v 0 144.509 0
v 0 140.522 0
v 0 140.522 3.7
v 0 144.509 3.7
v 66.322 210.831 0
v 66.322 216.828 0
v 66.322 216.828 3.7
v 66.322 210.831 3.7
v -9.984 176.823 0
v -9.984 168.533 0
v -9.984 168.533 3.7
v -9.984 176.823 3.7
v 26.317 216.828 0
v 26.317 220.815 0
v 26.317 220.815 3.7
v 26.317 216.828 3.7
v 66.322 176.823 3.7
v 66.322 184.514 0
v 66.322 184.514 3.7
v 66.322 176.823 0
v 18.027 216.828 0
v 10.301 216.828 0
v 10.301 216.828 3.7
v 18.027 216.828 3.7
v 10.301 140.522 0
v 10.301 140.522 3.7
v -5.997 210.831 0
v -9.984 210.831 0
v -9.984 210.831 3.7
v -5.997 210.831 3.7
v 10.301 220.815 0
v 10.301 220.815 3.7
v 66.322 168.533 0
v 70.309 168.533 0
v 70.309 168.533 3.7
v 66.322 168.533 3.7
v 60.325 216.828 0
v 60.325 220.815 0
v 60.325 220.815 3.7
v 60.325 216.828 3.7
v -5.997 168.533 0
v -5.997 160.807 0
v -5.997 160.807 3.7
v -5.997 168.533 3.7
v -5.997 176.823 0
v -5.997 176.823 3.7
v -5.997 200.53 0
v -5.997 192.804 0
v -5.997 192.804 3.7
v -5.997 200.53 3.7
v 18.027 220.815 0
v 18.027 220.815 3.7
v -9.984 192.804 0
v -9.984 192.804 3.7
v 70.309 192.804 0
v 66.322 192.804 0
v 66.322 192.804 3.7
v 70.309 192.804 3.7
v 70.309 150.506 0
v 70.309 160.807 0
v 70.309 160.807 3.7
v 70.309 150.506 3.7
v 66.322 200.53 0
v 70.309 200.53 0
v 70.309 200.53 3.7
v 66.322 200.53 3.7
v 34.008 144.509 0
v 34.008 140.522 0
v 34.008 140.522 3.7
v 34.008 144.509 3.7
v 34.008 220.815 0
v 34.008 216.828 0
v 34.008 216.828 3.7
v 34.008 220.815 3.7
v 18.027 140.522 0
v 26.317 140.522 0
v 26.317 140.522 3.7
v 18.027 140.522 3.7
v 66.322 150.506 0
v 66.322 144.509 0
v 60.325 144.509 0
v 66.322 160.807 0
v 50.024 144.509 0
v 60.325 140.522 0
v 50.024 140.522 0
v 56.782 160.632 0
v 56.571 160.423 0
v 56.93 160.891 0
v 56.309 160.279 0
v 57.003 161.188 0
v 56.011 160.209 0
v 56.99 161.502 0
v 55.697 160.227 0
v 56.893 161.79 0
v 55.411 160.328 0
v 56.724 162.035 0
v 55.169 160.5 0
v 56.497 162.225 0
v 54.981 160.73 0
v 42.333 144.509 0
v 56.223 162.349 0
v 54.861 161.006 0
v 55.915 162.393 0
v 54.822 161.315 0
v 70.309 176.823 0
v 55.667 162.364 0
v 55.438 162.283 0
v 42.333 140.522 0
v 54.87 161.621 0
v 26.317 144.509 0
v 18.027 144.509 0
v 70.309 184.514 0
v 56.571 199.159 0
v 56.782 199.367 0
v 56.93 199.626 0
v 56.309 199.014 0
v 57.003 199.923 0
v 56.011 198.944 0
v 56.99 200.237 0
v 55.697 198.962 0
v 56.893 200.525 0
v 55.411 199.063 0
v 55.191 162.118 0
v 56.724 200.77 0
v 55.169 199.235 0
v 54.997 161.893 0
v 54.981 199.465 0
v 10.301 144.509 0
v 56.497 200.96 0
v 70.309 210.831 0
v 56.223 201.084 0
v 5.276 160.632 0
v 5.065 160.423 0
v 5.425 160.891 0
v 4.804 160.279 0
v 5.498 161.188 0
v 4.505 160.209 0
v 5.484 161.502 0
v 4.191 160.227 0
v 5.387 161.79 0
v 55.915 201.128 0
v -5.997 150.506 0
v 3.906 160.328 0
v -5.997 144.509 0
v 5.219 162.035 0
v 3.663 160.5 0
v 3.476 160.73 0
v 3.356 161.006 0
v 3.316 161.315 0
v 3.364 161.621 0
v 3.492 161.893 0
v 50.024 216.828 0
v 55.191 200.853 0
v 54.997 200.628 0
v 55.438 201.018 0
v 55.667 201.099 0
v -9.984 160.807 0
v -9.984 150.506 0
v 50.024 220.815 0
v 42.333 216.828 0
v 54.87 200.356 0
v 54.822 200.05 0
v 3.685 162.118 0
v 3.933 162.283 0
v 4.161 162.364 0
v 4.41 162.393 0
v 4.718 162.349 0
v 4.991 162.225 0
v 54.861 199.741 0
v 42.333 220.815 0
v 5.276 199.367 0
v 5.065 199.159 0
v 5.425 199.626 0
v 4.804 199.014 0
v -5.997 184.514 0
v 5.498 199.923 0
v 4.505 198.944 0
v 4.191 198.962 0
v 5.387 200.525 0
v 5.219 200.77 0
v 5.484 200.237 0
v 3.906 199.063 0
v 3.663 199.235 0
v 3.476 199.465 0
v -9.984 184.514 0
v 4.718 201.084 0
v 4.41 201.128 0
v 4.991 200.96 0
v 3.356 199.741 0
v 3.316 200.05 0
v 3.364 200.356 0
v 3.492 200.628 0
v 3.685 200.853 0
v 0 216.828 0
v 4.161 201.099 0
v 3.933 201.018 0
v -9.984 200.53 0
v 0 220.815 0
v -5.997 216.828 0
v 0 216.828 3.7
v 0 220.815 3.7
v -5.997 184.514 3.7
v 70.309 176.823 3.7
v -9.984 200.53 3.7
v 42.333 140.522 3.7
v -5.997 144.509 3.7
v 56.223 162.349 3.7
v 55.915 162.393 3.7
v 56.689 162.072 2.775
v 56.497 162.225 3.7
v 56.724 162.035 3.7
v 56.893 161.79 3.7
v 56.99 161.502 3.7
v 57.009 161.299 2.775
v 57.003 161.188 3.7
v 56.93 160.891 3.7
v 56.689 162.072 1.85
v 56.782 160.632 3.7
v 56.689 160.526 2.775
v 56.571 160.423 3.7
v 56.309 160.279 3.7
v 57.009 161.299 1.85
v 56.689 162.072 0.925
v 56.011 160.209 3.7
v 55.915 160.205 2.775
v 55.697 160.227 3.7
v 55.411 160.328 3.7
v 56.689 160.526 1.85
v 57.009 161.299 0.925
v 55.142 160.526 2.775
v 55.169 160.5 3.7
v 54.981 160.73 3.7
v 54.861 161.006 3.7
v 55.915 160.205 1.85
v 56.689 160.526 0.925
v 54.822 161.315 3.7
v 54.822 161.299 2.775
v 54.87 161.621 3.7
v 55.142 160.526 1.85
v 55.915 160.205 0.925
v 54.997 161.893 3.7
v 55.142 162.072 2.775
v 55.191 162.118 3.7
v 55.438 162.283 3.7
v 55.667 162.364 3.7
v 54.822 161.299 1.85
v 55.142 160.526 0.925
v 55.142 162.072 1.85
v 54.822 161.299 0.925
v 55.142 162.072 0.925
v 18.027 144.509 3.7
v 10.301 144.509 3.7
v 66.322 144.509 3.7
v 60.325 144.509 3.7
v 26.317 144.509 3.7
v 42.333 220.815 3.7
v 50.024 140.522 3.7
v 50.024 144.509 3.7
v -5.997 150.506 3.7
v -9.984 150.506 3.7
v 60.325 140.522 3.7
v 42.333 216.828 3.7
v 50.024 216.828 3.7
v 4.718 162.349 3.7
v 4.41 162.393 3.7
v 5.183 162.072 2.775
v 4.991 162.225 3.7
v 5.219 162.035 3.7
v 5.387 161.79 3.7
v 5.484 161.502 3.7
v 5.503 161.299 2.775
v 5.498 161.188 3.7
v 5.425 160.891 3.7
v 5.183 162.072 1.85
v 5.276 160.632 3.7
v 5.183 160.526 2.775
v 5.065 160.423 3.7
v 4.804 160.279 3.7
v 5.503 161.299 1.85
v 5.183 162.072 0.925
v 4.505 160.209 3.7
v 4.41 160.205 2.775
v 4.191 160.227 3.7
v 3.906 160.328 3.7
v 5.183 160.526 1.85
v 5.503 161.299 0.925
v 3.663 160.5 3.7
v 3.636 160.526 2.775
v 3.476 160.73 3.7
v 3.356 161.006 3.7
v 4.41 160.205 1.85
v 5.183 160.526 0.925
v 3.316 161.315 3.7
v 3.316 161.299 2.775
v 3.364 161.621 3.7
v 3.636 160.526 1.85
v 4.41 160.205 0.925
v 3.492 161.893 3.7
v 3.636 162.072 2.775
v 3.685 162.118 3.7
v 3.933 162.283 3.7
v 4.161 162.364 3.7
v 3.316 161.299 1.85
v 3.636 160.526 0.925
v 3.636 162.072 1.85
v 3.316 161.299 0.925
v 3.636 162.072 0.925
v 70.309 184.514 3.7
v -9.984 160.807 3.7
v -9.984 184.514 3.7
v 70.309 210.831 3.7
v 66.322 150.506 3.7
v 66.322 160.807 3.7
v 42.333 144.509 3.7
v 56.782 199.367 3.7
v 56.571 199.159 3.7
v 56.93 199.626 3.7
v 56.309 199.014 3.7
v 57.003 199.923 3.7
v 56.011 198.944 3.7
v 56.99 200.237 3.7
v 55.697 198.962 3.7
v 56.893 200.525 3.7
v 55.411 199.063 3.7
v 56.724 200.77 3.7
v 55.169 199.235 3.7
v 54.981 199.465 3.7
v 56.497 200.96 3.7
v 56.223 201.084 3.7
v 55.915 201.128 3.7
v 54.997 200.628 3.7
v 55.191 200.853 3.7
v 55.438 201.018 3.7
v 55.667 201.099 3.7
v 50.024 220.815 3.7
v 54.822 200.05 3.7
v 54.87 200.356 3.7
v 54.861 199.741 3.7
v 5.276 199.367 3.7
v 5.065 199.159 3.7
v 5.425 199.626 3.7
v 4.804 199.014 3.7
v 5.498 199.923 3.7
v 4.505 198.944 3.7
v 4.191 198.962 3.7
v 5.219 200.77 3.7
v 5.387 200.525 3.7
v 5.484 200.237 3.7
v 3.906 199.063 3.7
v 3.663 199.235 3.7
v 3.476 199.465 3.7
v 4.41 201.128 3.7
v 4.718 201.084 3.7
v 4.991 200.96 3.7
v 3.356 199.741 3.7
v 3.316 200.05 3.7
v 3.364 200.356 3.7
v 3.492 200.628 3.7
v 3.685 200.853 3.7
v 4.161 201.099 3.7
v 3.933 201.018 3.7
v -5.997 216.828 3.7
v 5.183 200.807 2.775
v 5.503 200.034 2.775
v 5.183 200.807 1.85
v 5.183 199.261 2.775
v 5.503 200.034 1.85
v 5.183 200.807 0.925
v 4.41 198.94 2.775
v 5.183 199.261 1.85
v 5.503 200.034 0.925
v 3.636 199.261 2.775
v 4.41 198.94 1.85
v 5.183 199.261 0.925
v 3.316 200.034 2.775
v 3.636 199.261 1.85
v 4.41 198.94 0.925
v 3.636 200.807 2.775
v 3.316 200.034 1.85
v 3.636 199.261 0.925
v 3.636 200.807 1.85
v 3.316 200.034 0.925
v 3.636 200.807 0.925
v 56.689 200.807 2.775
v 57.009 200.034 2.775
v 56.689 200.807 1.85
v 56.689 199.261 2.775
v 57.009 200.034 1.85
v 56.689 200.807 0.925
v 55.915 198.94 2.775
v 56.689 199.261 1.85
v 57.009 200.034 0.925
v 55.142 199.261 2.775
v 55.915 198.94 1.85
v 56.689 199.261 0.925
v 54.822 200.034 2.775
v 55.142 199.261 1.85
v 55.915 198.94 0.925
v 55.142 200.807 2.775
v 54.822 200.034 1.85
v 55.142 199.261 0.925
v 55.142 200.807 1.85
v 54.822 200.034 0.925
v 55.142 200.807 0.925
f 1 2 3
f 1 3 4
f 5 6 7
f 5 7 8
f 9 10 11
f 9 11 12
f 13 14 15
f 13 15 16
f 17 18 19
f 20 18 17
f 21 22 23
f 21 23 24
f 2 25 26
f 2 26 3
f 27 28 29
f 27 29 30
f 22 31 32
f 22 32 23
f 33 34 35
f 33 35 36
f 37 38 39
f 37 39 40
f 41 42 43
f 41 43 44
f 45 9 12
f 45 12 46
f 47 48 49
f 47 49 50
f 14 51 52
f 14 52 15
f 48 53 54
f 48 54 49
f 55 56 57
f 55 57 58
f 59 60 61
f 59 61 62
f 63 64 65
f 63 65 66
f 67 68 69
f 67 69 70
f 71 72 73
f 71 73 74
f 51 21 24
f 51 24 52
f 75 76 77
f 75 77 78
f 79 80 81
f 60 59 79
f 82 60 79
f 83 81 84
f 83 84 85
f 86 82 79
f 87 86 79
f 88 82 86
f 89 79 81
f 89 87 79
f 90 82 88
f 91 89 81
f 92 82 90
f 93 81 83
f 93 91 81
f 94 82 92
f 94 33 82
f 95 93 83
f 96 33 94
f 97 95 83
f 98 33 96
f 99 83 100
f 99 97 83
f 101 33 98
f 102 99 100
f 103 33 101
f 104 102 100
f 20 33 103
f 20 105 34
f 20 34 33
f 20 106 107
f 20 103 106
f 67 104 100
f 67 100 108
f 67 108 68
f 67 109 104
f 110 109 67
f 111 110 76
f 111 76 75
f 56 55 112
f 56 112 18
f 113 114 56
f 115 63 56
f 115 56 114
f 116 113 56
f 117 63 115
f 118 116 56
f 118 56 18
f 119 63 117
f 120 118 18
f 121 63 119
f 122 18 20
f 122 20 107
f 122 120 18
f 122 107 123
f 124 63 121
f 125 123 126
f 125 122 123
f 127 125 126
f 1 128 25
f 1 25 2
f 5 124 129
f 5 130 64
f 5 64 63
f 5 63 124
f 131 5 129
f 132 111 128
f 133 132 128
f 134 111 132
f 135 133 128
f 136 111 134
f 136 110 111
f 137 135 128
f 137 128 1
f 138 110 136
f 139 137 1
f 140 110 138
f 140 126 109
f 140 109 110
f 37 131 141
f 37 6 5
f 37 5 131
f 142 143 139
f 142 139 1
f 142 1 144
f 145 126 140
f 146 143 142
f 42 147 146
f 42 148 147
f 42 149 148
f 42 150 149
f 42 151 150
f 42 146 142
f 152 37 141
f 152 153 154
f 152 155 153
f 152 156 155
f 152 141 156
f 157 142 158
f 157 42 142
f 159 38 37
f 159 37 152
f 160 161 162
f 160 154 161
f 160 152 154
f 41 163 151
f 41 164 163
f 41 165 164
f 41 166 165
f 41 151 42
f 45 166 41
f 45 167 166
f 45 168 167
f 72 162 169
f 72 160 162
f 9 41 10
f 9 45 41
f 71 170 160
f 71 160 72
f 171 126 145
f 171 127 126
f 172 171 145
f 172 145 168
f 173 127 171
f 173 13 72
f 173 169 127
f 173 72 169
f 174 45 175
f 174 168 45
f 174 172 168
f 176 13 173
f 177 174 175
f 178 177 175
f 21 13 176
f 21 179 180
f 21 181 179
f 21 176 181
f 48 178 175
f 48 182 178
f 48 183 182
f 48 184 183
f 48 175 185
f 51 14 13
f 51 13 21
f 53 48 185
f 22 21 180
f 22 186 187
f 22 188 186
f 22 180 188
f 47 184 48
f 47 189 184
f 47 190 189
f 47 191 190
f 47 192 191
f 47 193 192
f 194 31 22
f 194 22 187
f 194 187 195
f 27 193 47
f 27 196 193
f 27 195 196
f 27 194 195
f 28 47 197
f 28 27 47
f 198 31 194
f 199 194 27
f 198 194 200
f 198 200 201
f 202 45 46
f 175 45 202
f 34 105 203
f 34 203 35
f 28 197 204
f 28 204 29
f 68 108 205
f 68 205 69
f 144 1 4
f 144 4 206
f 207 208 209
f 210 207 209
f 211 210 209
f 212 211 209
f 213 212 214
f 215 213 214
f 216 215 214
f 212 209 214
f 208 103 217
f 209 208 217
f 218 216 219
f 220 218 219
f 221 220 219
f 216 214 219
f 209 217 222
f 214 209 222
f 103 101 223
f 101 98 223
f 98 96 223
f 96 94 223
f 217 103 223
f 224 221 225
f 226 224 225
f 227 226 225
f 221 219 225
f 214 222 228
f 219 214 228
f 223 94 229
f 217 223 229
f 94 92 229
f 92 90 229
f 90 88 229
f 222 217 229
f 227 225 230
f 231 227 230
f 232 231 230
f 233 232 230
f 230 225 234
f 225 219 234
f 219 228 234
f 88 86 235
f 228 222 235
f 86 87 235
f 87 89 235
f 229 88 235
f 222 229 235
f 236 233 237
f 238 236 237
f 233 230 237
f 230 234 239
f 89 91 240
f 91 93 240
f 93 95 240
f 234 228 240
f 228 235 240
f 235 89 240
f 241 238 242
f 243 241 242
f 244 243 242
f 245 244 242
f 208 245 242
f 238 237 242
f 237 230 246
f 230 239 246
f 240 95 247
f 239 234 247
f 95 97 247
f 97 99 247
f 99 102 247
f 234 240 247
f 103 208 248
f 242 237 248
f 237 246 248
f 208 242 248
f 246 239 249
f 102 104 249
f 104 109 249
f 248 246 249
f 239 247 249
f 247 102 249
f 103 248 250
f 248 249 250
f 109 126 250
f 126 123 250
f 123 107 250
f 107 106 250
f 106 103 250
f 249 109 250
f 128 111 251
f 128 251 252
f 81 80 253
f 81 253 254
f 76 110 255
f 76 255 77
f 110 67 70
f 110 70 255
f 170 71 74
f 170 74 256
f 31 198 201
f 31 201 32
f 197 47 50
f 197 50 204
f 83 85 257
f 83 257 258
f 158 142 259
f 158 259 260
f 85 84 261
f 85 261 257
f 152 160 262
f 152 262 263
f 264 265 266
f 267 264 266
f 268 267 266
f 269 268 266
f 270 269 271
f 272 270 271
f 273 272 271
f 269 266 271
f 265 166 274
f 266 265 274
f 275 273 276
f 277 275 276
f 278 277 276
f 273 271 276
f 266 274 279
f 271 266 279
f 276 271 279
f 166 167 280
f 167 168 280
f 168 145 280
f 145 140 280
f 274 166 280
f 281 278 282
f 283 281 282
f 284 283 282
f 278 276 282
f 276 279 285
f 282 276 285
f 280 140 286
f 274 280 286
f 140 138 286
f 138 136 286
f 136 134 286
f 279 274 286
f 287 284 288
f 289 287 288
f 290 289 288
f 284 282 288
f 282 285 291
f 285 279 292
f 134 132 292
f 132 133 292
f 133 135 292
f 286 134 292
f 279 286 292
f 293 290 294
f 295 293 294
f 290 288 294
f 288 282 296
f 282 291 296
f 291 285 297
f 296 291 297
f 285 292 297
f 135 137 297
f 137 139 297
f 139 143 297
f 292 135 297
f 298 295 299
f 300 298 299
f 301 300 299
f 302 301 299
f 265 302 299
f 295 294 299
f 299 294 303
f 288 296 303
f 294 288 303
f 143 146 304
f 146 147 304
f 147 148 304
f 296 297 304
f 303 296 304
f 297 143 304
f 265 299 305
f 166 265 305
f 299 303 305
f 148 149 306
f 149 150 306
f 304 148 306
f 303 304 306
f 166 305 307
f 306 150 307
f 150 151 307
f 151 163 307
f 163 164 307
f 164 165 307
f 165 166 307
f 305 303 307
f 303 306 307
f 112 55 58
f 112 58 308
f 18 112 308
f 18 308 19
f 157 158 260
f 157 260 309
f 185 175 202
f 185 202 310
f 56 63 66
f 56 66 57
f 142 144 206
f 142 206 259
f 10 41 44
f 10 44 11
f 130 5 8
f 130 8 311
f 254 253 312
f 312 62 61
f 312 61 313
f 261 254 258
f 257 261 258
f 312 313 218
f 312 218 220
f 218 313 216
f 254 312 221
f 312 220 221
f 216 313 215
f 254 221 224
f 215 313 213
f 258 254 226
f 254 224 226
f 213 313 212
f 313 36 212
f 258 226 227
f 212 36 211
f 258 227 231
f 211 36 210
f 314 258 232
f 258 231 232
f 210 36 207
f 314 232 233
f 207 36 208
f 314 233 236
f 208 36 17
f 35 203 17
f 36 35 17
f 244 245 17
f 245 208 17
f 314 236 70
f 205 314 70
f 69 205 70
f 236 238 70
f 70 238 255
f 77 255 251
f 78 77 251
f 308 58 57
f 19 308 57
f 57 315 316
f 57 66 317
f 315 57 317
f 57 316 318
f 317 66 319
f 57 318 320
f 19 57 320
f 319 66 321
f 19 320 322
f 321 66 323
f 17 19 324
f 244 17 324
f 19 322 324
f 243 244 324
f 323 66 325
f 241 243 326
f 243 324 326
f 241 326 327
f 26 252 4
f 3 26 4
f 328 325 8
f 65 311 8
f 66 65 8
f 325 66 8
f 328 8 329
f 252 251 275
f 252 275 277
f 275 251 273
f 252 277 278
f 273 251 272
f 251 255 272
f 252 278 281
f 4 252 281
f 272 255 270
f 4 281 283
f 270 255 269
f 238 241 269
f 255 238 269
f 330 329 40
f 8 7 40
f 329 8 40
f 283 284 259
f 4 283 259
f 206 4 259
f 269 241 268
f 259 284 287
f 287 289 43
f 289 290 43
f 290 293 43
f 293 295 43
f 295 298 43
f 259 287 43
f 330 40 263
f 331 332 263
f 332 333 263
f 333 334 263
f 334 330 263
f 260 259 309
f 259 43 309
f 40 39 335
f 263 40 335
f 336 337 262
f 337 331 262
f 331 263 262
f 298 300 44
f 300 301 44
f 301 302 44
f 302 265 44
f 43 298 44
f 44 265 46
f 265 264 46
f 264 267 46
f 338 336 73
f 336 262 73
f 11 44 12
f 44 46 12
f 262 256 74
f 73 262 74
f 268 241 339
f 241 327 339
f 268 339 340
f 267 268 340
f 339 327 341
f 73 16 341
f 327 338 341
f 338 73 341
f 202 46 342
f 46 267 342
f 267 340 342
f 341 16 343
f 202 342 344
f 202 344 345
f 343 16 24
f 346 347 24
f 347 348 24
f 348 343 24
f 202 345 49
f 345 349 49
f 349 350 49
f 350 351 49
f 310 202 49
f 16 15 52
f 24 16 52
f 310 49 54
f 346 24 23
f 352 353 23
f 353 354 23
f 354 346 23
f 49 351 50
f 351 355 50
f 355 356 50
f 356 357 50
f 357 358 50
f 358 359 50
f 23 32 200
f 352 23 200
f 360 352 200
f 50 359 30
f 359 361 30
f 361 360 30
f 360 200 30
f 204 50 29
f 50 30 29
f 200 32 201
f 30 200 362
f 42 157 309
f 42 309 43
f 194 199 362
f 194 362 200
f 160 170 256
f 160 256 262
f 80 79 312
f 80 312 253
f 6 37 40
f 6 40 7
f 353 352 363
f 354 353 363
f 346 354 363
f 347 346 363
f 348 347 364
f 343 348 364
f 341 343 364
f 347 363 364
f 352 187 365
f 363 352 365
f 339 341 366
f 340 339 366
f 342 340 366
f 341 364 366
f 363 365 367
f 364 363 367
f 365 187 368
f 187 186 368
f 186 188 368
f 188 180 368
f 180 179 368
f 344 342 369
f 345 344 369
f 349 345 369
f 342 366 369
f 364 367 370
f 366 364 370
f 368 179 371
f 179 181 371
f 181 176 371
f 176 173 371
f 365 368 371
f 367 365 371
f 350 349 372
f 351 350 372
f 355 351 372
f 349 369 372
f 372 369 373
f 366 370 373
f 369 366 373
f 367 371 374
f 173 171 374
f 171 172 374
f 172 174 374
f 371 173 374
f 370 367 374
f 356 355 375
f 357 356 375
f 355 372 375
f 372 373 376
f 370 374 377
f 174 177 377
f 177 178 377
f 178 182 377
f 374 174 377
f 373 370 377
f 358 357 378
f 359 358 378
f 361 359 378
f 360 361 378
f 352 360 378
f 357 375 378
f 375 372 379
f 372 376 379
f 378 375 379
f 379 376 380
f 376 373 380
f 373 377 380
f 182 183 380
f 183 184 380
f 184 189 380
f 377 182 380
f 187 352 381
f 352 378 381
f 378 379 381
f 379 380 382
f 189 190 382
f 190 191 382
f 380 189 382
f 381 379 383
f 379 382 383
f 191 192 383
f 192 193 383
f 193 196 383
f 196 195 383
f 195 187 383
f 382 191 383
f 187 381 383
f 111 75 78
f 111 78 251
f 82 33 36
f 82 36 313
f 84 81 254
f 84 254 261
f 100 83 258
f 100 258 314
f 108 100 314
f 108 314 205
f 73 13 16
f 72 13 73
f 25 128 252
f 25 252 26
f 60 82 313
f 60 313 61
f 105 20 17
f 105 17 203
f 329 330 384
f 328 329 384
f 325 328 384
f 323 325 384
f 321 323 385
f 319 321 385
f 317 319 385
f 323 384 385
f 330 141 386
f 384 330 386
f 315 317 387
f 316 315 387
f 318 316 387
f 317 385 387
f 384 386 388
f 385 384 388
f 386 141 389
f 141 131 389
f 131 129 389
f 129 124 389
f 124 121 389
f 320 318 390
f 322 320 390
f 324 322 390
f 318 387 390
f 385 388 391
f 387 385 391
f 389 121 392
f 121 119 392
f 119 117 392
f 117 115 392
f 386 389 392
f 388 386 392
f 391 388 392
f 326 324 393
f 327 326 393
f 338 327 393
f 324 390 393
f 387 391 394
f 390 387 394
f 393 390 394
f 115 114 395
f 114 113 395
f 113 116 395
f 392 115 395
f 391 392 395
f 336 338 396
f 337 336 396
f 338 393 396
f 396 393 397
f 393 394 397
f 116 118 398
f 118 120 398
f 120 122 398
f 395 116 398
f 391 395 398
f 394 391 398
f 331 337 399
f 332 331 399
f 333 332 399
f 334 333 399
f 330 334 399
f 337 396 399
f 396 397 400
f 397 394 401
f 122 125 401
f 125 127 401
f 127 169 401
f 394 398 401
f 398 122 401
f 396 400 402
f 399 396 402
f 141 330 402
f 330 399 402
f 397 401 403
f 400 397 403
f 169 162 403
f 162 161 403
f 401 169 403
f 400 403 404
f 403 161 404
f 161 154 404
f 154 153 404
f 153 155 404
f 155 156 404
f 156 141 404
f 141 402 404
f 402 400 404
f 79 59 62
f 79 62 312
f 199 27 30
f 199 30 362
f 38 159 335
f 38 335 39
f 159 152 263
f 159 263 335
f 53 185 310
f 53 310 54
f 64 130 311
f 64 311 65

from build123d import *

# Parameters (mm, degrees)
BOSS_EXTRUDE1_DEPTH = 3.7


with BuildPart() as part:
    # Model → Boss-Extrude1 (new body)
    with BuildSketch(Plane.XY):
        Polygon((-5.997220875, 216.82832197), (1.346e-06, 216.82832197), (1.346e-06, 220.814711934), (10.301111378, 220.814711934), (10.301111378, 216.82832197), (18.026945247, 216.82832197), (18.026945247, 220.814711934), (26.31722235, 220.814711934), (26.31722235, 216.82832197), (34.007778034, 216.82832197), (34.007778034, 220.814711934), (42.333333323, 220.814711934), (42.333333323, 216.82832197), (50.023888607, 216.82832197), (50.023888607, 220.814711934), (60.325001331, 220.814711934), (60.325001331, 216.82832197), (66.322223551, 216.82832197), (66.322223551, 210.831099749), (70.308610824, 210.831099749), (70.308610824, 200.529989717), (66.322223551, 200.529989717), (66.322223551, 192.80415652), (70.308610824, 192.80415652), (70.308610824, 184.513878576), (66.322223551, 184.513878576), (66.322223551, 176.823322787), (70.308610824, 176.823322787), (70.308610824, 168.533045011), (66.322223551, 168.533045011), (66.322223551, 160.807212487), (70.308610824, 160.807212487), (70.308610824, 150.506099764), (66.322223551, 150.506099764), (66.322223551, 144.508877543), (60.325001331, 144.508877543), (60.325001331, 140.522487579), (50.023888607, 140.522487579), (50.023888607, 144.508877543), (42.333333323, 144.508877543), (42.333333323, 140.522487579), (34.007778034, 140.522487579), (34.007778034, 144.508877543), (26.31722235, 144.508877543), (26.31722235, 140.522487579), (18.026945247, 140.522487579), (18.026945247, 144.508877543), (10.301111378, 144.508877543), (10.301111378, 140.522487579), (1.346e-06, 140.522487579), (1.346e-06, 144.508877543), (-5.997220875, 144.508877543), (-5.997220875, 150.506099764), (-9.983610839, 150.506099764), (-9.983610839, 160.807212487), (-5.997220875, 160.807212487), (-5.997220875, 168.533045011), (-9.983610839, 168.533045011), (-9.983610839, 176.823322787), (-5.997220875, 176.823322787), (-5.997220875, 184.513878576), (-9.983610839, 184.513878576), (-9.983610839, 192.80415652), (-5.997220875, 192.80415652), (-5.997220875, 200.529989717), (-9.983610839, 200.529989717), (-9.983610839, 210.831099749), (-5.997220875, 210.831099749), align=None)
        with BuildLine():
            add(Edge.make_bspline(
                [(4.409715492, 198.940379596), (3.805731041, 198.940379596), (3.316103574, 199.430003026), (3.316103574, 200.03399286), (3.316103574, 200.637982694), (3.805731041, 201.127606124), (4.409715492, 201.127606124)],
                knots=[2, 2, 2, 2, 3, 3, 3, 4, 4, 4, 4], degree=3))
            add(Edge.make_bspline(
                [(4.409715492, 201.127606124), (5.013699944, 201.127606124), (5.503326065, 200.637982694), (5.503326065, 200.03399286), (5.503326065, 199.430003026), (5.013699944, 198.940379596), (4.409715492, 198.940379596)],
                knots=[0, 0, 0, 0, 1, 1, 1, 2, 2, 2, 2], degree=3))
        make_face(mode=Mode.SUBTRACT)
        with BuildLine():
            add(Edge.make_bspline(
                [(55.915272381, 160.205373146), (55.31128793, 160.205373146), (54.821661808, 160.694996576), (54.821661808, 161.298986411), (54.821661808, 161.902976245), (55.31128793, 162.392599675), (55.915272381, 162.392599675)],
                knots=[2, 2, 2, 2, 3, 3, 3, 4, 4, 4, 4], degree=3))
            add(Edge.make_bspline(
                [(55.915272381, 162.392599675), (56.519256832, 162.392599675), (57.008882953, 161.902976245), (57.008882953, 161.298986411), (57.008882953, 160.694996576), (56.519256832, 160.205373146), (55.915272381, 160.205373146)],
                knots=[0, 0, 0, 0, 1, 1, 1, 2, 2, 2, 2], degree=3))
        make_face(mode=Mode.SUBTRACT)
        with BuildLine():
            add(Edge.make_bspline(
                [(4.409715492, 160.205373146), (3.805731041, 160.205373146), (3.316103574, 160.694996576), (3.316103574, 161.298986411), (3.316103574, 161.902976245), (3.805731041, 162.392599675), (4.409715492, 162.392599675)],
                knots=[2, 2, 2, 2, 3, 3, 3, 4, 4, 4, 4], degree=3))
            add(Edge.make_bspline(
                [(4.409715492, 162.392599675), (5.013699944, 162.392599675), (5.503326065, 161.902976245), (5.503326065, 161.298986411), (5.503326065, 160.694996576), (5.013699944, 160.205373146), (4.409715492, 160.205373146)],
                knots=[0, 0, 0, 0, 1, 1, 1, 2, 2, 2, 2], degree=3))
        make_face(mode=Mode.SUBTRACT)
        with BuildLine():
            add(Edge.make_bspline(
                [(55.915272381, 198.940379596), (55.31128793, 198.940379596), (54.821661808, 199.430003026), (54.821661808, 200.03399286), (54.821661808, 200.637982694), (55.31128793, 201.127606124), (55.915272381, 201.127606124)],
                knots=[2, 2, 2, 2, 3, 3, 3, 4, 4, 4, 4], degree=3))
            add(Edge.make_bspline(
                [(55.915272381, 201.127606124), (56.519256832, 201.127606124), (57.008882953, 200.637982694), (57.008882953, 200.03399286), (57.008882953, 199.430003026), (56.519256832, 198.940379596), (55.915272381, 198.940379596)],
                knots=[0, 0, 0, 0, 1, 1, 1, 2, 2, 2, 2], degree=3))
        make_face(mode=Mode.SUBTRACT)
    extrude(amount=BOSS_EXTRUDE1_DEPTH)


solid = part.part
